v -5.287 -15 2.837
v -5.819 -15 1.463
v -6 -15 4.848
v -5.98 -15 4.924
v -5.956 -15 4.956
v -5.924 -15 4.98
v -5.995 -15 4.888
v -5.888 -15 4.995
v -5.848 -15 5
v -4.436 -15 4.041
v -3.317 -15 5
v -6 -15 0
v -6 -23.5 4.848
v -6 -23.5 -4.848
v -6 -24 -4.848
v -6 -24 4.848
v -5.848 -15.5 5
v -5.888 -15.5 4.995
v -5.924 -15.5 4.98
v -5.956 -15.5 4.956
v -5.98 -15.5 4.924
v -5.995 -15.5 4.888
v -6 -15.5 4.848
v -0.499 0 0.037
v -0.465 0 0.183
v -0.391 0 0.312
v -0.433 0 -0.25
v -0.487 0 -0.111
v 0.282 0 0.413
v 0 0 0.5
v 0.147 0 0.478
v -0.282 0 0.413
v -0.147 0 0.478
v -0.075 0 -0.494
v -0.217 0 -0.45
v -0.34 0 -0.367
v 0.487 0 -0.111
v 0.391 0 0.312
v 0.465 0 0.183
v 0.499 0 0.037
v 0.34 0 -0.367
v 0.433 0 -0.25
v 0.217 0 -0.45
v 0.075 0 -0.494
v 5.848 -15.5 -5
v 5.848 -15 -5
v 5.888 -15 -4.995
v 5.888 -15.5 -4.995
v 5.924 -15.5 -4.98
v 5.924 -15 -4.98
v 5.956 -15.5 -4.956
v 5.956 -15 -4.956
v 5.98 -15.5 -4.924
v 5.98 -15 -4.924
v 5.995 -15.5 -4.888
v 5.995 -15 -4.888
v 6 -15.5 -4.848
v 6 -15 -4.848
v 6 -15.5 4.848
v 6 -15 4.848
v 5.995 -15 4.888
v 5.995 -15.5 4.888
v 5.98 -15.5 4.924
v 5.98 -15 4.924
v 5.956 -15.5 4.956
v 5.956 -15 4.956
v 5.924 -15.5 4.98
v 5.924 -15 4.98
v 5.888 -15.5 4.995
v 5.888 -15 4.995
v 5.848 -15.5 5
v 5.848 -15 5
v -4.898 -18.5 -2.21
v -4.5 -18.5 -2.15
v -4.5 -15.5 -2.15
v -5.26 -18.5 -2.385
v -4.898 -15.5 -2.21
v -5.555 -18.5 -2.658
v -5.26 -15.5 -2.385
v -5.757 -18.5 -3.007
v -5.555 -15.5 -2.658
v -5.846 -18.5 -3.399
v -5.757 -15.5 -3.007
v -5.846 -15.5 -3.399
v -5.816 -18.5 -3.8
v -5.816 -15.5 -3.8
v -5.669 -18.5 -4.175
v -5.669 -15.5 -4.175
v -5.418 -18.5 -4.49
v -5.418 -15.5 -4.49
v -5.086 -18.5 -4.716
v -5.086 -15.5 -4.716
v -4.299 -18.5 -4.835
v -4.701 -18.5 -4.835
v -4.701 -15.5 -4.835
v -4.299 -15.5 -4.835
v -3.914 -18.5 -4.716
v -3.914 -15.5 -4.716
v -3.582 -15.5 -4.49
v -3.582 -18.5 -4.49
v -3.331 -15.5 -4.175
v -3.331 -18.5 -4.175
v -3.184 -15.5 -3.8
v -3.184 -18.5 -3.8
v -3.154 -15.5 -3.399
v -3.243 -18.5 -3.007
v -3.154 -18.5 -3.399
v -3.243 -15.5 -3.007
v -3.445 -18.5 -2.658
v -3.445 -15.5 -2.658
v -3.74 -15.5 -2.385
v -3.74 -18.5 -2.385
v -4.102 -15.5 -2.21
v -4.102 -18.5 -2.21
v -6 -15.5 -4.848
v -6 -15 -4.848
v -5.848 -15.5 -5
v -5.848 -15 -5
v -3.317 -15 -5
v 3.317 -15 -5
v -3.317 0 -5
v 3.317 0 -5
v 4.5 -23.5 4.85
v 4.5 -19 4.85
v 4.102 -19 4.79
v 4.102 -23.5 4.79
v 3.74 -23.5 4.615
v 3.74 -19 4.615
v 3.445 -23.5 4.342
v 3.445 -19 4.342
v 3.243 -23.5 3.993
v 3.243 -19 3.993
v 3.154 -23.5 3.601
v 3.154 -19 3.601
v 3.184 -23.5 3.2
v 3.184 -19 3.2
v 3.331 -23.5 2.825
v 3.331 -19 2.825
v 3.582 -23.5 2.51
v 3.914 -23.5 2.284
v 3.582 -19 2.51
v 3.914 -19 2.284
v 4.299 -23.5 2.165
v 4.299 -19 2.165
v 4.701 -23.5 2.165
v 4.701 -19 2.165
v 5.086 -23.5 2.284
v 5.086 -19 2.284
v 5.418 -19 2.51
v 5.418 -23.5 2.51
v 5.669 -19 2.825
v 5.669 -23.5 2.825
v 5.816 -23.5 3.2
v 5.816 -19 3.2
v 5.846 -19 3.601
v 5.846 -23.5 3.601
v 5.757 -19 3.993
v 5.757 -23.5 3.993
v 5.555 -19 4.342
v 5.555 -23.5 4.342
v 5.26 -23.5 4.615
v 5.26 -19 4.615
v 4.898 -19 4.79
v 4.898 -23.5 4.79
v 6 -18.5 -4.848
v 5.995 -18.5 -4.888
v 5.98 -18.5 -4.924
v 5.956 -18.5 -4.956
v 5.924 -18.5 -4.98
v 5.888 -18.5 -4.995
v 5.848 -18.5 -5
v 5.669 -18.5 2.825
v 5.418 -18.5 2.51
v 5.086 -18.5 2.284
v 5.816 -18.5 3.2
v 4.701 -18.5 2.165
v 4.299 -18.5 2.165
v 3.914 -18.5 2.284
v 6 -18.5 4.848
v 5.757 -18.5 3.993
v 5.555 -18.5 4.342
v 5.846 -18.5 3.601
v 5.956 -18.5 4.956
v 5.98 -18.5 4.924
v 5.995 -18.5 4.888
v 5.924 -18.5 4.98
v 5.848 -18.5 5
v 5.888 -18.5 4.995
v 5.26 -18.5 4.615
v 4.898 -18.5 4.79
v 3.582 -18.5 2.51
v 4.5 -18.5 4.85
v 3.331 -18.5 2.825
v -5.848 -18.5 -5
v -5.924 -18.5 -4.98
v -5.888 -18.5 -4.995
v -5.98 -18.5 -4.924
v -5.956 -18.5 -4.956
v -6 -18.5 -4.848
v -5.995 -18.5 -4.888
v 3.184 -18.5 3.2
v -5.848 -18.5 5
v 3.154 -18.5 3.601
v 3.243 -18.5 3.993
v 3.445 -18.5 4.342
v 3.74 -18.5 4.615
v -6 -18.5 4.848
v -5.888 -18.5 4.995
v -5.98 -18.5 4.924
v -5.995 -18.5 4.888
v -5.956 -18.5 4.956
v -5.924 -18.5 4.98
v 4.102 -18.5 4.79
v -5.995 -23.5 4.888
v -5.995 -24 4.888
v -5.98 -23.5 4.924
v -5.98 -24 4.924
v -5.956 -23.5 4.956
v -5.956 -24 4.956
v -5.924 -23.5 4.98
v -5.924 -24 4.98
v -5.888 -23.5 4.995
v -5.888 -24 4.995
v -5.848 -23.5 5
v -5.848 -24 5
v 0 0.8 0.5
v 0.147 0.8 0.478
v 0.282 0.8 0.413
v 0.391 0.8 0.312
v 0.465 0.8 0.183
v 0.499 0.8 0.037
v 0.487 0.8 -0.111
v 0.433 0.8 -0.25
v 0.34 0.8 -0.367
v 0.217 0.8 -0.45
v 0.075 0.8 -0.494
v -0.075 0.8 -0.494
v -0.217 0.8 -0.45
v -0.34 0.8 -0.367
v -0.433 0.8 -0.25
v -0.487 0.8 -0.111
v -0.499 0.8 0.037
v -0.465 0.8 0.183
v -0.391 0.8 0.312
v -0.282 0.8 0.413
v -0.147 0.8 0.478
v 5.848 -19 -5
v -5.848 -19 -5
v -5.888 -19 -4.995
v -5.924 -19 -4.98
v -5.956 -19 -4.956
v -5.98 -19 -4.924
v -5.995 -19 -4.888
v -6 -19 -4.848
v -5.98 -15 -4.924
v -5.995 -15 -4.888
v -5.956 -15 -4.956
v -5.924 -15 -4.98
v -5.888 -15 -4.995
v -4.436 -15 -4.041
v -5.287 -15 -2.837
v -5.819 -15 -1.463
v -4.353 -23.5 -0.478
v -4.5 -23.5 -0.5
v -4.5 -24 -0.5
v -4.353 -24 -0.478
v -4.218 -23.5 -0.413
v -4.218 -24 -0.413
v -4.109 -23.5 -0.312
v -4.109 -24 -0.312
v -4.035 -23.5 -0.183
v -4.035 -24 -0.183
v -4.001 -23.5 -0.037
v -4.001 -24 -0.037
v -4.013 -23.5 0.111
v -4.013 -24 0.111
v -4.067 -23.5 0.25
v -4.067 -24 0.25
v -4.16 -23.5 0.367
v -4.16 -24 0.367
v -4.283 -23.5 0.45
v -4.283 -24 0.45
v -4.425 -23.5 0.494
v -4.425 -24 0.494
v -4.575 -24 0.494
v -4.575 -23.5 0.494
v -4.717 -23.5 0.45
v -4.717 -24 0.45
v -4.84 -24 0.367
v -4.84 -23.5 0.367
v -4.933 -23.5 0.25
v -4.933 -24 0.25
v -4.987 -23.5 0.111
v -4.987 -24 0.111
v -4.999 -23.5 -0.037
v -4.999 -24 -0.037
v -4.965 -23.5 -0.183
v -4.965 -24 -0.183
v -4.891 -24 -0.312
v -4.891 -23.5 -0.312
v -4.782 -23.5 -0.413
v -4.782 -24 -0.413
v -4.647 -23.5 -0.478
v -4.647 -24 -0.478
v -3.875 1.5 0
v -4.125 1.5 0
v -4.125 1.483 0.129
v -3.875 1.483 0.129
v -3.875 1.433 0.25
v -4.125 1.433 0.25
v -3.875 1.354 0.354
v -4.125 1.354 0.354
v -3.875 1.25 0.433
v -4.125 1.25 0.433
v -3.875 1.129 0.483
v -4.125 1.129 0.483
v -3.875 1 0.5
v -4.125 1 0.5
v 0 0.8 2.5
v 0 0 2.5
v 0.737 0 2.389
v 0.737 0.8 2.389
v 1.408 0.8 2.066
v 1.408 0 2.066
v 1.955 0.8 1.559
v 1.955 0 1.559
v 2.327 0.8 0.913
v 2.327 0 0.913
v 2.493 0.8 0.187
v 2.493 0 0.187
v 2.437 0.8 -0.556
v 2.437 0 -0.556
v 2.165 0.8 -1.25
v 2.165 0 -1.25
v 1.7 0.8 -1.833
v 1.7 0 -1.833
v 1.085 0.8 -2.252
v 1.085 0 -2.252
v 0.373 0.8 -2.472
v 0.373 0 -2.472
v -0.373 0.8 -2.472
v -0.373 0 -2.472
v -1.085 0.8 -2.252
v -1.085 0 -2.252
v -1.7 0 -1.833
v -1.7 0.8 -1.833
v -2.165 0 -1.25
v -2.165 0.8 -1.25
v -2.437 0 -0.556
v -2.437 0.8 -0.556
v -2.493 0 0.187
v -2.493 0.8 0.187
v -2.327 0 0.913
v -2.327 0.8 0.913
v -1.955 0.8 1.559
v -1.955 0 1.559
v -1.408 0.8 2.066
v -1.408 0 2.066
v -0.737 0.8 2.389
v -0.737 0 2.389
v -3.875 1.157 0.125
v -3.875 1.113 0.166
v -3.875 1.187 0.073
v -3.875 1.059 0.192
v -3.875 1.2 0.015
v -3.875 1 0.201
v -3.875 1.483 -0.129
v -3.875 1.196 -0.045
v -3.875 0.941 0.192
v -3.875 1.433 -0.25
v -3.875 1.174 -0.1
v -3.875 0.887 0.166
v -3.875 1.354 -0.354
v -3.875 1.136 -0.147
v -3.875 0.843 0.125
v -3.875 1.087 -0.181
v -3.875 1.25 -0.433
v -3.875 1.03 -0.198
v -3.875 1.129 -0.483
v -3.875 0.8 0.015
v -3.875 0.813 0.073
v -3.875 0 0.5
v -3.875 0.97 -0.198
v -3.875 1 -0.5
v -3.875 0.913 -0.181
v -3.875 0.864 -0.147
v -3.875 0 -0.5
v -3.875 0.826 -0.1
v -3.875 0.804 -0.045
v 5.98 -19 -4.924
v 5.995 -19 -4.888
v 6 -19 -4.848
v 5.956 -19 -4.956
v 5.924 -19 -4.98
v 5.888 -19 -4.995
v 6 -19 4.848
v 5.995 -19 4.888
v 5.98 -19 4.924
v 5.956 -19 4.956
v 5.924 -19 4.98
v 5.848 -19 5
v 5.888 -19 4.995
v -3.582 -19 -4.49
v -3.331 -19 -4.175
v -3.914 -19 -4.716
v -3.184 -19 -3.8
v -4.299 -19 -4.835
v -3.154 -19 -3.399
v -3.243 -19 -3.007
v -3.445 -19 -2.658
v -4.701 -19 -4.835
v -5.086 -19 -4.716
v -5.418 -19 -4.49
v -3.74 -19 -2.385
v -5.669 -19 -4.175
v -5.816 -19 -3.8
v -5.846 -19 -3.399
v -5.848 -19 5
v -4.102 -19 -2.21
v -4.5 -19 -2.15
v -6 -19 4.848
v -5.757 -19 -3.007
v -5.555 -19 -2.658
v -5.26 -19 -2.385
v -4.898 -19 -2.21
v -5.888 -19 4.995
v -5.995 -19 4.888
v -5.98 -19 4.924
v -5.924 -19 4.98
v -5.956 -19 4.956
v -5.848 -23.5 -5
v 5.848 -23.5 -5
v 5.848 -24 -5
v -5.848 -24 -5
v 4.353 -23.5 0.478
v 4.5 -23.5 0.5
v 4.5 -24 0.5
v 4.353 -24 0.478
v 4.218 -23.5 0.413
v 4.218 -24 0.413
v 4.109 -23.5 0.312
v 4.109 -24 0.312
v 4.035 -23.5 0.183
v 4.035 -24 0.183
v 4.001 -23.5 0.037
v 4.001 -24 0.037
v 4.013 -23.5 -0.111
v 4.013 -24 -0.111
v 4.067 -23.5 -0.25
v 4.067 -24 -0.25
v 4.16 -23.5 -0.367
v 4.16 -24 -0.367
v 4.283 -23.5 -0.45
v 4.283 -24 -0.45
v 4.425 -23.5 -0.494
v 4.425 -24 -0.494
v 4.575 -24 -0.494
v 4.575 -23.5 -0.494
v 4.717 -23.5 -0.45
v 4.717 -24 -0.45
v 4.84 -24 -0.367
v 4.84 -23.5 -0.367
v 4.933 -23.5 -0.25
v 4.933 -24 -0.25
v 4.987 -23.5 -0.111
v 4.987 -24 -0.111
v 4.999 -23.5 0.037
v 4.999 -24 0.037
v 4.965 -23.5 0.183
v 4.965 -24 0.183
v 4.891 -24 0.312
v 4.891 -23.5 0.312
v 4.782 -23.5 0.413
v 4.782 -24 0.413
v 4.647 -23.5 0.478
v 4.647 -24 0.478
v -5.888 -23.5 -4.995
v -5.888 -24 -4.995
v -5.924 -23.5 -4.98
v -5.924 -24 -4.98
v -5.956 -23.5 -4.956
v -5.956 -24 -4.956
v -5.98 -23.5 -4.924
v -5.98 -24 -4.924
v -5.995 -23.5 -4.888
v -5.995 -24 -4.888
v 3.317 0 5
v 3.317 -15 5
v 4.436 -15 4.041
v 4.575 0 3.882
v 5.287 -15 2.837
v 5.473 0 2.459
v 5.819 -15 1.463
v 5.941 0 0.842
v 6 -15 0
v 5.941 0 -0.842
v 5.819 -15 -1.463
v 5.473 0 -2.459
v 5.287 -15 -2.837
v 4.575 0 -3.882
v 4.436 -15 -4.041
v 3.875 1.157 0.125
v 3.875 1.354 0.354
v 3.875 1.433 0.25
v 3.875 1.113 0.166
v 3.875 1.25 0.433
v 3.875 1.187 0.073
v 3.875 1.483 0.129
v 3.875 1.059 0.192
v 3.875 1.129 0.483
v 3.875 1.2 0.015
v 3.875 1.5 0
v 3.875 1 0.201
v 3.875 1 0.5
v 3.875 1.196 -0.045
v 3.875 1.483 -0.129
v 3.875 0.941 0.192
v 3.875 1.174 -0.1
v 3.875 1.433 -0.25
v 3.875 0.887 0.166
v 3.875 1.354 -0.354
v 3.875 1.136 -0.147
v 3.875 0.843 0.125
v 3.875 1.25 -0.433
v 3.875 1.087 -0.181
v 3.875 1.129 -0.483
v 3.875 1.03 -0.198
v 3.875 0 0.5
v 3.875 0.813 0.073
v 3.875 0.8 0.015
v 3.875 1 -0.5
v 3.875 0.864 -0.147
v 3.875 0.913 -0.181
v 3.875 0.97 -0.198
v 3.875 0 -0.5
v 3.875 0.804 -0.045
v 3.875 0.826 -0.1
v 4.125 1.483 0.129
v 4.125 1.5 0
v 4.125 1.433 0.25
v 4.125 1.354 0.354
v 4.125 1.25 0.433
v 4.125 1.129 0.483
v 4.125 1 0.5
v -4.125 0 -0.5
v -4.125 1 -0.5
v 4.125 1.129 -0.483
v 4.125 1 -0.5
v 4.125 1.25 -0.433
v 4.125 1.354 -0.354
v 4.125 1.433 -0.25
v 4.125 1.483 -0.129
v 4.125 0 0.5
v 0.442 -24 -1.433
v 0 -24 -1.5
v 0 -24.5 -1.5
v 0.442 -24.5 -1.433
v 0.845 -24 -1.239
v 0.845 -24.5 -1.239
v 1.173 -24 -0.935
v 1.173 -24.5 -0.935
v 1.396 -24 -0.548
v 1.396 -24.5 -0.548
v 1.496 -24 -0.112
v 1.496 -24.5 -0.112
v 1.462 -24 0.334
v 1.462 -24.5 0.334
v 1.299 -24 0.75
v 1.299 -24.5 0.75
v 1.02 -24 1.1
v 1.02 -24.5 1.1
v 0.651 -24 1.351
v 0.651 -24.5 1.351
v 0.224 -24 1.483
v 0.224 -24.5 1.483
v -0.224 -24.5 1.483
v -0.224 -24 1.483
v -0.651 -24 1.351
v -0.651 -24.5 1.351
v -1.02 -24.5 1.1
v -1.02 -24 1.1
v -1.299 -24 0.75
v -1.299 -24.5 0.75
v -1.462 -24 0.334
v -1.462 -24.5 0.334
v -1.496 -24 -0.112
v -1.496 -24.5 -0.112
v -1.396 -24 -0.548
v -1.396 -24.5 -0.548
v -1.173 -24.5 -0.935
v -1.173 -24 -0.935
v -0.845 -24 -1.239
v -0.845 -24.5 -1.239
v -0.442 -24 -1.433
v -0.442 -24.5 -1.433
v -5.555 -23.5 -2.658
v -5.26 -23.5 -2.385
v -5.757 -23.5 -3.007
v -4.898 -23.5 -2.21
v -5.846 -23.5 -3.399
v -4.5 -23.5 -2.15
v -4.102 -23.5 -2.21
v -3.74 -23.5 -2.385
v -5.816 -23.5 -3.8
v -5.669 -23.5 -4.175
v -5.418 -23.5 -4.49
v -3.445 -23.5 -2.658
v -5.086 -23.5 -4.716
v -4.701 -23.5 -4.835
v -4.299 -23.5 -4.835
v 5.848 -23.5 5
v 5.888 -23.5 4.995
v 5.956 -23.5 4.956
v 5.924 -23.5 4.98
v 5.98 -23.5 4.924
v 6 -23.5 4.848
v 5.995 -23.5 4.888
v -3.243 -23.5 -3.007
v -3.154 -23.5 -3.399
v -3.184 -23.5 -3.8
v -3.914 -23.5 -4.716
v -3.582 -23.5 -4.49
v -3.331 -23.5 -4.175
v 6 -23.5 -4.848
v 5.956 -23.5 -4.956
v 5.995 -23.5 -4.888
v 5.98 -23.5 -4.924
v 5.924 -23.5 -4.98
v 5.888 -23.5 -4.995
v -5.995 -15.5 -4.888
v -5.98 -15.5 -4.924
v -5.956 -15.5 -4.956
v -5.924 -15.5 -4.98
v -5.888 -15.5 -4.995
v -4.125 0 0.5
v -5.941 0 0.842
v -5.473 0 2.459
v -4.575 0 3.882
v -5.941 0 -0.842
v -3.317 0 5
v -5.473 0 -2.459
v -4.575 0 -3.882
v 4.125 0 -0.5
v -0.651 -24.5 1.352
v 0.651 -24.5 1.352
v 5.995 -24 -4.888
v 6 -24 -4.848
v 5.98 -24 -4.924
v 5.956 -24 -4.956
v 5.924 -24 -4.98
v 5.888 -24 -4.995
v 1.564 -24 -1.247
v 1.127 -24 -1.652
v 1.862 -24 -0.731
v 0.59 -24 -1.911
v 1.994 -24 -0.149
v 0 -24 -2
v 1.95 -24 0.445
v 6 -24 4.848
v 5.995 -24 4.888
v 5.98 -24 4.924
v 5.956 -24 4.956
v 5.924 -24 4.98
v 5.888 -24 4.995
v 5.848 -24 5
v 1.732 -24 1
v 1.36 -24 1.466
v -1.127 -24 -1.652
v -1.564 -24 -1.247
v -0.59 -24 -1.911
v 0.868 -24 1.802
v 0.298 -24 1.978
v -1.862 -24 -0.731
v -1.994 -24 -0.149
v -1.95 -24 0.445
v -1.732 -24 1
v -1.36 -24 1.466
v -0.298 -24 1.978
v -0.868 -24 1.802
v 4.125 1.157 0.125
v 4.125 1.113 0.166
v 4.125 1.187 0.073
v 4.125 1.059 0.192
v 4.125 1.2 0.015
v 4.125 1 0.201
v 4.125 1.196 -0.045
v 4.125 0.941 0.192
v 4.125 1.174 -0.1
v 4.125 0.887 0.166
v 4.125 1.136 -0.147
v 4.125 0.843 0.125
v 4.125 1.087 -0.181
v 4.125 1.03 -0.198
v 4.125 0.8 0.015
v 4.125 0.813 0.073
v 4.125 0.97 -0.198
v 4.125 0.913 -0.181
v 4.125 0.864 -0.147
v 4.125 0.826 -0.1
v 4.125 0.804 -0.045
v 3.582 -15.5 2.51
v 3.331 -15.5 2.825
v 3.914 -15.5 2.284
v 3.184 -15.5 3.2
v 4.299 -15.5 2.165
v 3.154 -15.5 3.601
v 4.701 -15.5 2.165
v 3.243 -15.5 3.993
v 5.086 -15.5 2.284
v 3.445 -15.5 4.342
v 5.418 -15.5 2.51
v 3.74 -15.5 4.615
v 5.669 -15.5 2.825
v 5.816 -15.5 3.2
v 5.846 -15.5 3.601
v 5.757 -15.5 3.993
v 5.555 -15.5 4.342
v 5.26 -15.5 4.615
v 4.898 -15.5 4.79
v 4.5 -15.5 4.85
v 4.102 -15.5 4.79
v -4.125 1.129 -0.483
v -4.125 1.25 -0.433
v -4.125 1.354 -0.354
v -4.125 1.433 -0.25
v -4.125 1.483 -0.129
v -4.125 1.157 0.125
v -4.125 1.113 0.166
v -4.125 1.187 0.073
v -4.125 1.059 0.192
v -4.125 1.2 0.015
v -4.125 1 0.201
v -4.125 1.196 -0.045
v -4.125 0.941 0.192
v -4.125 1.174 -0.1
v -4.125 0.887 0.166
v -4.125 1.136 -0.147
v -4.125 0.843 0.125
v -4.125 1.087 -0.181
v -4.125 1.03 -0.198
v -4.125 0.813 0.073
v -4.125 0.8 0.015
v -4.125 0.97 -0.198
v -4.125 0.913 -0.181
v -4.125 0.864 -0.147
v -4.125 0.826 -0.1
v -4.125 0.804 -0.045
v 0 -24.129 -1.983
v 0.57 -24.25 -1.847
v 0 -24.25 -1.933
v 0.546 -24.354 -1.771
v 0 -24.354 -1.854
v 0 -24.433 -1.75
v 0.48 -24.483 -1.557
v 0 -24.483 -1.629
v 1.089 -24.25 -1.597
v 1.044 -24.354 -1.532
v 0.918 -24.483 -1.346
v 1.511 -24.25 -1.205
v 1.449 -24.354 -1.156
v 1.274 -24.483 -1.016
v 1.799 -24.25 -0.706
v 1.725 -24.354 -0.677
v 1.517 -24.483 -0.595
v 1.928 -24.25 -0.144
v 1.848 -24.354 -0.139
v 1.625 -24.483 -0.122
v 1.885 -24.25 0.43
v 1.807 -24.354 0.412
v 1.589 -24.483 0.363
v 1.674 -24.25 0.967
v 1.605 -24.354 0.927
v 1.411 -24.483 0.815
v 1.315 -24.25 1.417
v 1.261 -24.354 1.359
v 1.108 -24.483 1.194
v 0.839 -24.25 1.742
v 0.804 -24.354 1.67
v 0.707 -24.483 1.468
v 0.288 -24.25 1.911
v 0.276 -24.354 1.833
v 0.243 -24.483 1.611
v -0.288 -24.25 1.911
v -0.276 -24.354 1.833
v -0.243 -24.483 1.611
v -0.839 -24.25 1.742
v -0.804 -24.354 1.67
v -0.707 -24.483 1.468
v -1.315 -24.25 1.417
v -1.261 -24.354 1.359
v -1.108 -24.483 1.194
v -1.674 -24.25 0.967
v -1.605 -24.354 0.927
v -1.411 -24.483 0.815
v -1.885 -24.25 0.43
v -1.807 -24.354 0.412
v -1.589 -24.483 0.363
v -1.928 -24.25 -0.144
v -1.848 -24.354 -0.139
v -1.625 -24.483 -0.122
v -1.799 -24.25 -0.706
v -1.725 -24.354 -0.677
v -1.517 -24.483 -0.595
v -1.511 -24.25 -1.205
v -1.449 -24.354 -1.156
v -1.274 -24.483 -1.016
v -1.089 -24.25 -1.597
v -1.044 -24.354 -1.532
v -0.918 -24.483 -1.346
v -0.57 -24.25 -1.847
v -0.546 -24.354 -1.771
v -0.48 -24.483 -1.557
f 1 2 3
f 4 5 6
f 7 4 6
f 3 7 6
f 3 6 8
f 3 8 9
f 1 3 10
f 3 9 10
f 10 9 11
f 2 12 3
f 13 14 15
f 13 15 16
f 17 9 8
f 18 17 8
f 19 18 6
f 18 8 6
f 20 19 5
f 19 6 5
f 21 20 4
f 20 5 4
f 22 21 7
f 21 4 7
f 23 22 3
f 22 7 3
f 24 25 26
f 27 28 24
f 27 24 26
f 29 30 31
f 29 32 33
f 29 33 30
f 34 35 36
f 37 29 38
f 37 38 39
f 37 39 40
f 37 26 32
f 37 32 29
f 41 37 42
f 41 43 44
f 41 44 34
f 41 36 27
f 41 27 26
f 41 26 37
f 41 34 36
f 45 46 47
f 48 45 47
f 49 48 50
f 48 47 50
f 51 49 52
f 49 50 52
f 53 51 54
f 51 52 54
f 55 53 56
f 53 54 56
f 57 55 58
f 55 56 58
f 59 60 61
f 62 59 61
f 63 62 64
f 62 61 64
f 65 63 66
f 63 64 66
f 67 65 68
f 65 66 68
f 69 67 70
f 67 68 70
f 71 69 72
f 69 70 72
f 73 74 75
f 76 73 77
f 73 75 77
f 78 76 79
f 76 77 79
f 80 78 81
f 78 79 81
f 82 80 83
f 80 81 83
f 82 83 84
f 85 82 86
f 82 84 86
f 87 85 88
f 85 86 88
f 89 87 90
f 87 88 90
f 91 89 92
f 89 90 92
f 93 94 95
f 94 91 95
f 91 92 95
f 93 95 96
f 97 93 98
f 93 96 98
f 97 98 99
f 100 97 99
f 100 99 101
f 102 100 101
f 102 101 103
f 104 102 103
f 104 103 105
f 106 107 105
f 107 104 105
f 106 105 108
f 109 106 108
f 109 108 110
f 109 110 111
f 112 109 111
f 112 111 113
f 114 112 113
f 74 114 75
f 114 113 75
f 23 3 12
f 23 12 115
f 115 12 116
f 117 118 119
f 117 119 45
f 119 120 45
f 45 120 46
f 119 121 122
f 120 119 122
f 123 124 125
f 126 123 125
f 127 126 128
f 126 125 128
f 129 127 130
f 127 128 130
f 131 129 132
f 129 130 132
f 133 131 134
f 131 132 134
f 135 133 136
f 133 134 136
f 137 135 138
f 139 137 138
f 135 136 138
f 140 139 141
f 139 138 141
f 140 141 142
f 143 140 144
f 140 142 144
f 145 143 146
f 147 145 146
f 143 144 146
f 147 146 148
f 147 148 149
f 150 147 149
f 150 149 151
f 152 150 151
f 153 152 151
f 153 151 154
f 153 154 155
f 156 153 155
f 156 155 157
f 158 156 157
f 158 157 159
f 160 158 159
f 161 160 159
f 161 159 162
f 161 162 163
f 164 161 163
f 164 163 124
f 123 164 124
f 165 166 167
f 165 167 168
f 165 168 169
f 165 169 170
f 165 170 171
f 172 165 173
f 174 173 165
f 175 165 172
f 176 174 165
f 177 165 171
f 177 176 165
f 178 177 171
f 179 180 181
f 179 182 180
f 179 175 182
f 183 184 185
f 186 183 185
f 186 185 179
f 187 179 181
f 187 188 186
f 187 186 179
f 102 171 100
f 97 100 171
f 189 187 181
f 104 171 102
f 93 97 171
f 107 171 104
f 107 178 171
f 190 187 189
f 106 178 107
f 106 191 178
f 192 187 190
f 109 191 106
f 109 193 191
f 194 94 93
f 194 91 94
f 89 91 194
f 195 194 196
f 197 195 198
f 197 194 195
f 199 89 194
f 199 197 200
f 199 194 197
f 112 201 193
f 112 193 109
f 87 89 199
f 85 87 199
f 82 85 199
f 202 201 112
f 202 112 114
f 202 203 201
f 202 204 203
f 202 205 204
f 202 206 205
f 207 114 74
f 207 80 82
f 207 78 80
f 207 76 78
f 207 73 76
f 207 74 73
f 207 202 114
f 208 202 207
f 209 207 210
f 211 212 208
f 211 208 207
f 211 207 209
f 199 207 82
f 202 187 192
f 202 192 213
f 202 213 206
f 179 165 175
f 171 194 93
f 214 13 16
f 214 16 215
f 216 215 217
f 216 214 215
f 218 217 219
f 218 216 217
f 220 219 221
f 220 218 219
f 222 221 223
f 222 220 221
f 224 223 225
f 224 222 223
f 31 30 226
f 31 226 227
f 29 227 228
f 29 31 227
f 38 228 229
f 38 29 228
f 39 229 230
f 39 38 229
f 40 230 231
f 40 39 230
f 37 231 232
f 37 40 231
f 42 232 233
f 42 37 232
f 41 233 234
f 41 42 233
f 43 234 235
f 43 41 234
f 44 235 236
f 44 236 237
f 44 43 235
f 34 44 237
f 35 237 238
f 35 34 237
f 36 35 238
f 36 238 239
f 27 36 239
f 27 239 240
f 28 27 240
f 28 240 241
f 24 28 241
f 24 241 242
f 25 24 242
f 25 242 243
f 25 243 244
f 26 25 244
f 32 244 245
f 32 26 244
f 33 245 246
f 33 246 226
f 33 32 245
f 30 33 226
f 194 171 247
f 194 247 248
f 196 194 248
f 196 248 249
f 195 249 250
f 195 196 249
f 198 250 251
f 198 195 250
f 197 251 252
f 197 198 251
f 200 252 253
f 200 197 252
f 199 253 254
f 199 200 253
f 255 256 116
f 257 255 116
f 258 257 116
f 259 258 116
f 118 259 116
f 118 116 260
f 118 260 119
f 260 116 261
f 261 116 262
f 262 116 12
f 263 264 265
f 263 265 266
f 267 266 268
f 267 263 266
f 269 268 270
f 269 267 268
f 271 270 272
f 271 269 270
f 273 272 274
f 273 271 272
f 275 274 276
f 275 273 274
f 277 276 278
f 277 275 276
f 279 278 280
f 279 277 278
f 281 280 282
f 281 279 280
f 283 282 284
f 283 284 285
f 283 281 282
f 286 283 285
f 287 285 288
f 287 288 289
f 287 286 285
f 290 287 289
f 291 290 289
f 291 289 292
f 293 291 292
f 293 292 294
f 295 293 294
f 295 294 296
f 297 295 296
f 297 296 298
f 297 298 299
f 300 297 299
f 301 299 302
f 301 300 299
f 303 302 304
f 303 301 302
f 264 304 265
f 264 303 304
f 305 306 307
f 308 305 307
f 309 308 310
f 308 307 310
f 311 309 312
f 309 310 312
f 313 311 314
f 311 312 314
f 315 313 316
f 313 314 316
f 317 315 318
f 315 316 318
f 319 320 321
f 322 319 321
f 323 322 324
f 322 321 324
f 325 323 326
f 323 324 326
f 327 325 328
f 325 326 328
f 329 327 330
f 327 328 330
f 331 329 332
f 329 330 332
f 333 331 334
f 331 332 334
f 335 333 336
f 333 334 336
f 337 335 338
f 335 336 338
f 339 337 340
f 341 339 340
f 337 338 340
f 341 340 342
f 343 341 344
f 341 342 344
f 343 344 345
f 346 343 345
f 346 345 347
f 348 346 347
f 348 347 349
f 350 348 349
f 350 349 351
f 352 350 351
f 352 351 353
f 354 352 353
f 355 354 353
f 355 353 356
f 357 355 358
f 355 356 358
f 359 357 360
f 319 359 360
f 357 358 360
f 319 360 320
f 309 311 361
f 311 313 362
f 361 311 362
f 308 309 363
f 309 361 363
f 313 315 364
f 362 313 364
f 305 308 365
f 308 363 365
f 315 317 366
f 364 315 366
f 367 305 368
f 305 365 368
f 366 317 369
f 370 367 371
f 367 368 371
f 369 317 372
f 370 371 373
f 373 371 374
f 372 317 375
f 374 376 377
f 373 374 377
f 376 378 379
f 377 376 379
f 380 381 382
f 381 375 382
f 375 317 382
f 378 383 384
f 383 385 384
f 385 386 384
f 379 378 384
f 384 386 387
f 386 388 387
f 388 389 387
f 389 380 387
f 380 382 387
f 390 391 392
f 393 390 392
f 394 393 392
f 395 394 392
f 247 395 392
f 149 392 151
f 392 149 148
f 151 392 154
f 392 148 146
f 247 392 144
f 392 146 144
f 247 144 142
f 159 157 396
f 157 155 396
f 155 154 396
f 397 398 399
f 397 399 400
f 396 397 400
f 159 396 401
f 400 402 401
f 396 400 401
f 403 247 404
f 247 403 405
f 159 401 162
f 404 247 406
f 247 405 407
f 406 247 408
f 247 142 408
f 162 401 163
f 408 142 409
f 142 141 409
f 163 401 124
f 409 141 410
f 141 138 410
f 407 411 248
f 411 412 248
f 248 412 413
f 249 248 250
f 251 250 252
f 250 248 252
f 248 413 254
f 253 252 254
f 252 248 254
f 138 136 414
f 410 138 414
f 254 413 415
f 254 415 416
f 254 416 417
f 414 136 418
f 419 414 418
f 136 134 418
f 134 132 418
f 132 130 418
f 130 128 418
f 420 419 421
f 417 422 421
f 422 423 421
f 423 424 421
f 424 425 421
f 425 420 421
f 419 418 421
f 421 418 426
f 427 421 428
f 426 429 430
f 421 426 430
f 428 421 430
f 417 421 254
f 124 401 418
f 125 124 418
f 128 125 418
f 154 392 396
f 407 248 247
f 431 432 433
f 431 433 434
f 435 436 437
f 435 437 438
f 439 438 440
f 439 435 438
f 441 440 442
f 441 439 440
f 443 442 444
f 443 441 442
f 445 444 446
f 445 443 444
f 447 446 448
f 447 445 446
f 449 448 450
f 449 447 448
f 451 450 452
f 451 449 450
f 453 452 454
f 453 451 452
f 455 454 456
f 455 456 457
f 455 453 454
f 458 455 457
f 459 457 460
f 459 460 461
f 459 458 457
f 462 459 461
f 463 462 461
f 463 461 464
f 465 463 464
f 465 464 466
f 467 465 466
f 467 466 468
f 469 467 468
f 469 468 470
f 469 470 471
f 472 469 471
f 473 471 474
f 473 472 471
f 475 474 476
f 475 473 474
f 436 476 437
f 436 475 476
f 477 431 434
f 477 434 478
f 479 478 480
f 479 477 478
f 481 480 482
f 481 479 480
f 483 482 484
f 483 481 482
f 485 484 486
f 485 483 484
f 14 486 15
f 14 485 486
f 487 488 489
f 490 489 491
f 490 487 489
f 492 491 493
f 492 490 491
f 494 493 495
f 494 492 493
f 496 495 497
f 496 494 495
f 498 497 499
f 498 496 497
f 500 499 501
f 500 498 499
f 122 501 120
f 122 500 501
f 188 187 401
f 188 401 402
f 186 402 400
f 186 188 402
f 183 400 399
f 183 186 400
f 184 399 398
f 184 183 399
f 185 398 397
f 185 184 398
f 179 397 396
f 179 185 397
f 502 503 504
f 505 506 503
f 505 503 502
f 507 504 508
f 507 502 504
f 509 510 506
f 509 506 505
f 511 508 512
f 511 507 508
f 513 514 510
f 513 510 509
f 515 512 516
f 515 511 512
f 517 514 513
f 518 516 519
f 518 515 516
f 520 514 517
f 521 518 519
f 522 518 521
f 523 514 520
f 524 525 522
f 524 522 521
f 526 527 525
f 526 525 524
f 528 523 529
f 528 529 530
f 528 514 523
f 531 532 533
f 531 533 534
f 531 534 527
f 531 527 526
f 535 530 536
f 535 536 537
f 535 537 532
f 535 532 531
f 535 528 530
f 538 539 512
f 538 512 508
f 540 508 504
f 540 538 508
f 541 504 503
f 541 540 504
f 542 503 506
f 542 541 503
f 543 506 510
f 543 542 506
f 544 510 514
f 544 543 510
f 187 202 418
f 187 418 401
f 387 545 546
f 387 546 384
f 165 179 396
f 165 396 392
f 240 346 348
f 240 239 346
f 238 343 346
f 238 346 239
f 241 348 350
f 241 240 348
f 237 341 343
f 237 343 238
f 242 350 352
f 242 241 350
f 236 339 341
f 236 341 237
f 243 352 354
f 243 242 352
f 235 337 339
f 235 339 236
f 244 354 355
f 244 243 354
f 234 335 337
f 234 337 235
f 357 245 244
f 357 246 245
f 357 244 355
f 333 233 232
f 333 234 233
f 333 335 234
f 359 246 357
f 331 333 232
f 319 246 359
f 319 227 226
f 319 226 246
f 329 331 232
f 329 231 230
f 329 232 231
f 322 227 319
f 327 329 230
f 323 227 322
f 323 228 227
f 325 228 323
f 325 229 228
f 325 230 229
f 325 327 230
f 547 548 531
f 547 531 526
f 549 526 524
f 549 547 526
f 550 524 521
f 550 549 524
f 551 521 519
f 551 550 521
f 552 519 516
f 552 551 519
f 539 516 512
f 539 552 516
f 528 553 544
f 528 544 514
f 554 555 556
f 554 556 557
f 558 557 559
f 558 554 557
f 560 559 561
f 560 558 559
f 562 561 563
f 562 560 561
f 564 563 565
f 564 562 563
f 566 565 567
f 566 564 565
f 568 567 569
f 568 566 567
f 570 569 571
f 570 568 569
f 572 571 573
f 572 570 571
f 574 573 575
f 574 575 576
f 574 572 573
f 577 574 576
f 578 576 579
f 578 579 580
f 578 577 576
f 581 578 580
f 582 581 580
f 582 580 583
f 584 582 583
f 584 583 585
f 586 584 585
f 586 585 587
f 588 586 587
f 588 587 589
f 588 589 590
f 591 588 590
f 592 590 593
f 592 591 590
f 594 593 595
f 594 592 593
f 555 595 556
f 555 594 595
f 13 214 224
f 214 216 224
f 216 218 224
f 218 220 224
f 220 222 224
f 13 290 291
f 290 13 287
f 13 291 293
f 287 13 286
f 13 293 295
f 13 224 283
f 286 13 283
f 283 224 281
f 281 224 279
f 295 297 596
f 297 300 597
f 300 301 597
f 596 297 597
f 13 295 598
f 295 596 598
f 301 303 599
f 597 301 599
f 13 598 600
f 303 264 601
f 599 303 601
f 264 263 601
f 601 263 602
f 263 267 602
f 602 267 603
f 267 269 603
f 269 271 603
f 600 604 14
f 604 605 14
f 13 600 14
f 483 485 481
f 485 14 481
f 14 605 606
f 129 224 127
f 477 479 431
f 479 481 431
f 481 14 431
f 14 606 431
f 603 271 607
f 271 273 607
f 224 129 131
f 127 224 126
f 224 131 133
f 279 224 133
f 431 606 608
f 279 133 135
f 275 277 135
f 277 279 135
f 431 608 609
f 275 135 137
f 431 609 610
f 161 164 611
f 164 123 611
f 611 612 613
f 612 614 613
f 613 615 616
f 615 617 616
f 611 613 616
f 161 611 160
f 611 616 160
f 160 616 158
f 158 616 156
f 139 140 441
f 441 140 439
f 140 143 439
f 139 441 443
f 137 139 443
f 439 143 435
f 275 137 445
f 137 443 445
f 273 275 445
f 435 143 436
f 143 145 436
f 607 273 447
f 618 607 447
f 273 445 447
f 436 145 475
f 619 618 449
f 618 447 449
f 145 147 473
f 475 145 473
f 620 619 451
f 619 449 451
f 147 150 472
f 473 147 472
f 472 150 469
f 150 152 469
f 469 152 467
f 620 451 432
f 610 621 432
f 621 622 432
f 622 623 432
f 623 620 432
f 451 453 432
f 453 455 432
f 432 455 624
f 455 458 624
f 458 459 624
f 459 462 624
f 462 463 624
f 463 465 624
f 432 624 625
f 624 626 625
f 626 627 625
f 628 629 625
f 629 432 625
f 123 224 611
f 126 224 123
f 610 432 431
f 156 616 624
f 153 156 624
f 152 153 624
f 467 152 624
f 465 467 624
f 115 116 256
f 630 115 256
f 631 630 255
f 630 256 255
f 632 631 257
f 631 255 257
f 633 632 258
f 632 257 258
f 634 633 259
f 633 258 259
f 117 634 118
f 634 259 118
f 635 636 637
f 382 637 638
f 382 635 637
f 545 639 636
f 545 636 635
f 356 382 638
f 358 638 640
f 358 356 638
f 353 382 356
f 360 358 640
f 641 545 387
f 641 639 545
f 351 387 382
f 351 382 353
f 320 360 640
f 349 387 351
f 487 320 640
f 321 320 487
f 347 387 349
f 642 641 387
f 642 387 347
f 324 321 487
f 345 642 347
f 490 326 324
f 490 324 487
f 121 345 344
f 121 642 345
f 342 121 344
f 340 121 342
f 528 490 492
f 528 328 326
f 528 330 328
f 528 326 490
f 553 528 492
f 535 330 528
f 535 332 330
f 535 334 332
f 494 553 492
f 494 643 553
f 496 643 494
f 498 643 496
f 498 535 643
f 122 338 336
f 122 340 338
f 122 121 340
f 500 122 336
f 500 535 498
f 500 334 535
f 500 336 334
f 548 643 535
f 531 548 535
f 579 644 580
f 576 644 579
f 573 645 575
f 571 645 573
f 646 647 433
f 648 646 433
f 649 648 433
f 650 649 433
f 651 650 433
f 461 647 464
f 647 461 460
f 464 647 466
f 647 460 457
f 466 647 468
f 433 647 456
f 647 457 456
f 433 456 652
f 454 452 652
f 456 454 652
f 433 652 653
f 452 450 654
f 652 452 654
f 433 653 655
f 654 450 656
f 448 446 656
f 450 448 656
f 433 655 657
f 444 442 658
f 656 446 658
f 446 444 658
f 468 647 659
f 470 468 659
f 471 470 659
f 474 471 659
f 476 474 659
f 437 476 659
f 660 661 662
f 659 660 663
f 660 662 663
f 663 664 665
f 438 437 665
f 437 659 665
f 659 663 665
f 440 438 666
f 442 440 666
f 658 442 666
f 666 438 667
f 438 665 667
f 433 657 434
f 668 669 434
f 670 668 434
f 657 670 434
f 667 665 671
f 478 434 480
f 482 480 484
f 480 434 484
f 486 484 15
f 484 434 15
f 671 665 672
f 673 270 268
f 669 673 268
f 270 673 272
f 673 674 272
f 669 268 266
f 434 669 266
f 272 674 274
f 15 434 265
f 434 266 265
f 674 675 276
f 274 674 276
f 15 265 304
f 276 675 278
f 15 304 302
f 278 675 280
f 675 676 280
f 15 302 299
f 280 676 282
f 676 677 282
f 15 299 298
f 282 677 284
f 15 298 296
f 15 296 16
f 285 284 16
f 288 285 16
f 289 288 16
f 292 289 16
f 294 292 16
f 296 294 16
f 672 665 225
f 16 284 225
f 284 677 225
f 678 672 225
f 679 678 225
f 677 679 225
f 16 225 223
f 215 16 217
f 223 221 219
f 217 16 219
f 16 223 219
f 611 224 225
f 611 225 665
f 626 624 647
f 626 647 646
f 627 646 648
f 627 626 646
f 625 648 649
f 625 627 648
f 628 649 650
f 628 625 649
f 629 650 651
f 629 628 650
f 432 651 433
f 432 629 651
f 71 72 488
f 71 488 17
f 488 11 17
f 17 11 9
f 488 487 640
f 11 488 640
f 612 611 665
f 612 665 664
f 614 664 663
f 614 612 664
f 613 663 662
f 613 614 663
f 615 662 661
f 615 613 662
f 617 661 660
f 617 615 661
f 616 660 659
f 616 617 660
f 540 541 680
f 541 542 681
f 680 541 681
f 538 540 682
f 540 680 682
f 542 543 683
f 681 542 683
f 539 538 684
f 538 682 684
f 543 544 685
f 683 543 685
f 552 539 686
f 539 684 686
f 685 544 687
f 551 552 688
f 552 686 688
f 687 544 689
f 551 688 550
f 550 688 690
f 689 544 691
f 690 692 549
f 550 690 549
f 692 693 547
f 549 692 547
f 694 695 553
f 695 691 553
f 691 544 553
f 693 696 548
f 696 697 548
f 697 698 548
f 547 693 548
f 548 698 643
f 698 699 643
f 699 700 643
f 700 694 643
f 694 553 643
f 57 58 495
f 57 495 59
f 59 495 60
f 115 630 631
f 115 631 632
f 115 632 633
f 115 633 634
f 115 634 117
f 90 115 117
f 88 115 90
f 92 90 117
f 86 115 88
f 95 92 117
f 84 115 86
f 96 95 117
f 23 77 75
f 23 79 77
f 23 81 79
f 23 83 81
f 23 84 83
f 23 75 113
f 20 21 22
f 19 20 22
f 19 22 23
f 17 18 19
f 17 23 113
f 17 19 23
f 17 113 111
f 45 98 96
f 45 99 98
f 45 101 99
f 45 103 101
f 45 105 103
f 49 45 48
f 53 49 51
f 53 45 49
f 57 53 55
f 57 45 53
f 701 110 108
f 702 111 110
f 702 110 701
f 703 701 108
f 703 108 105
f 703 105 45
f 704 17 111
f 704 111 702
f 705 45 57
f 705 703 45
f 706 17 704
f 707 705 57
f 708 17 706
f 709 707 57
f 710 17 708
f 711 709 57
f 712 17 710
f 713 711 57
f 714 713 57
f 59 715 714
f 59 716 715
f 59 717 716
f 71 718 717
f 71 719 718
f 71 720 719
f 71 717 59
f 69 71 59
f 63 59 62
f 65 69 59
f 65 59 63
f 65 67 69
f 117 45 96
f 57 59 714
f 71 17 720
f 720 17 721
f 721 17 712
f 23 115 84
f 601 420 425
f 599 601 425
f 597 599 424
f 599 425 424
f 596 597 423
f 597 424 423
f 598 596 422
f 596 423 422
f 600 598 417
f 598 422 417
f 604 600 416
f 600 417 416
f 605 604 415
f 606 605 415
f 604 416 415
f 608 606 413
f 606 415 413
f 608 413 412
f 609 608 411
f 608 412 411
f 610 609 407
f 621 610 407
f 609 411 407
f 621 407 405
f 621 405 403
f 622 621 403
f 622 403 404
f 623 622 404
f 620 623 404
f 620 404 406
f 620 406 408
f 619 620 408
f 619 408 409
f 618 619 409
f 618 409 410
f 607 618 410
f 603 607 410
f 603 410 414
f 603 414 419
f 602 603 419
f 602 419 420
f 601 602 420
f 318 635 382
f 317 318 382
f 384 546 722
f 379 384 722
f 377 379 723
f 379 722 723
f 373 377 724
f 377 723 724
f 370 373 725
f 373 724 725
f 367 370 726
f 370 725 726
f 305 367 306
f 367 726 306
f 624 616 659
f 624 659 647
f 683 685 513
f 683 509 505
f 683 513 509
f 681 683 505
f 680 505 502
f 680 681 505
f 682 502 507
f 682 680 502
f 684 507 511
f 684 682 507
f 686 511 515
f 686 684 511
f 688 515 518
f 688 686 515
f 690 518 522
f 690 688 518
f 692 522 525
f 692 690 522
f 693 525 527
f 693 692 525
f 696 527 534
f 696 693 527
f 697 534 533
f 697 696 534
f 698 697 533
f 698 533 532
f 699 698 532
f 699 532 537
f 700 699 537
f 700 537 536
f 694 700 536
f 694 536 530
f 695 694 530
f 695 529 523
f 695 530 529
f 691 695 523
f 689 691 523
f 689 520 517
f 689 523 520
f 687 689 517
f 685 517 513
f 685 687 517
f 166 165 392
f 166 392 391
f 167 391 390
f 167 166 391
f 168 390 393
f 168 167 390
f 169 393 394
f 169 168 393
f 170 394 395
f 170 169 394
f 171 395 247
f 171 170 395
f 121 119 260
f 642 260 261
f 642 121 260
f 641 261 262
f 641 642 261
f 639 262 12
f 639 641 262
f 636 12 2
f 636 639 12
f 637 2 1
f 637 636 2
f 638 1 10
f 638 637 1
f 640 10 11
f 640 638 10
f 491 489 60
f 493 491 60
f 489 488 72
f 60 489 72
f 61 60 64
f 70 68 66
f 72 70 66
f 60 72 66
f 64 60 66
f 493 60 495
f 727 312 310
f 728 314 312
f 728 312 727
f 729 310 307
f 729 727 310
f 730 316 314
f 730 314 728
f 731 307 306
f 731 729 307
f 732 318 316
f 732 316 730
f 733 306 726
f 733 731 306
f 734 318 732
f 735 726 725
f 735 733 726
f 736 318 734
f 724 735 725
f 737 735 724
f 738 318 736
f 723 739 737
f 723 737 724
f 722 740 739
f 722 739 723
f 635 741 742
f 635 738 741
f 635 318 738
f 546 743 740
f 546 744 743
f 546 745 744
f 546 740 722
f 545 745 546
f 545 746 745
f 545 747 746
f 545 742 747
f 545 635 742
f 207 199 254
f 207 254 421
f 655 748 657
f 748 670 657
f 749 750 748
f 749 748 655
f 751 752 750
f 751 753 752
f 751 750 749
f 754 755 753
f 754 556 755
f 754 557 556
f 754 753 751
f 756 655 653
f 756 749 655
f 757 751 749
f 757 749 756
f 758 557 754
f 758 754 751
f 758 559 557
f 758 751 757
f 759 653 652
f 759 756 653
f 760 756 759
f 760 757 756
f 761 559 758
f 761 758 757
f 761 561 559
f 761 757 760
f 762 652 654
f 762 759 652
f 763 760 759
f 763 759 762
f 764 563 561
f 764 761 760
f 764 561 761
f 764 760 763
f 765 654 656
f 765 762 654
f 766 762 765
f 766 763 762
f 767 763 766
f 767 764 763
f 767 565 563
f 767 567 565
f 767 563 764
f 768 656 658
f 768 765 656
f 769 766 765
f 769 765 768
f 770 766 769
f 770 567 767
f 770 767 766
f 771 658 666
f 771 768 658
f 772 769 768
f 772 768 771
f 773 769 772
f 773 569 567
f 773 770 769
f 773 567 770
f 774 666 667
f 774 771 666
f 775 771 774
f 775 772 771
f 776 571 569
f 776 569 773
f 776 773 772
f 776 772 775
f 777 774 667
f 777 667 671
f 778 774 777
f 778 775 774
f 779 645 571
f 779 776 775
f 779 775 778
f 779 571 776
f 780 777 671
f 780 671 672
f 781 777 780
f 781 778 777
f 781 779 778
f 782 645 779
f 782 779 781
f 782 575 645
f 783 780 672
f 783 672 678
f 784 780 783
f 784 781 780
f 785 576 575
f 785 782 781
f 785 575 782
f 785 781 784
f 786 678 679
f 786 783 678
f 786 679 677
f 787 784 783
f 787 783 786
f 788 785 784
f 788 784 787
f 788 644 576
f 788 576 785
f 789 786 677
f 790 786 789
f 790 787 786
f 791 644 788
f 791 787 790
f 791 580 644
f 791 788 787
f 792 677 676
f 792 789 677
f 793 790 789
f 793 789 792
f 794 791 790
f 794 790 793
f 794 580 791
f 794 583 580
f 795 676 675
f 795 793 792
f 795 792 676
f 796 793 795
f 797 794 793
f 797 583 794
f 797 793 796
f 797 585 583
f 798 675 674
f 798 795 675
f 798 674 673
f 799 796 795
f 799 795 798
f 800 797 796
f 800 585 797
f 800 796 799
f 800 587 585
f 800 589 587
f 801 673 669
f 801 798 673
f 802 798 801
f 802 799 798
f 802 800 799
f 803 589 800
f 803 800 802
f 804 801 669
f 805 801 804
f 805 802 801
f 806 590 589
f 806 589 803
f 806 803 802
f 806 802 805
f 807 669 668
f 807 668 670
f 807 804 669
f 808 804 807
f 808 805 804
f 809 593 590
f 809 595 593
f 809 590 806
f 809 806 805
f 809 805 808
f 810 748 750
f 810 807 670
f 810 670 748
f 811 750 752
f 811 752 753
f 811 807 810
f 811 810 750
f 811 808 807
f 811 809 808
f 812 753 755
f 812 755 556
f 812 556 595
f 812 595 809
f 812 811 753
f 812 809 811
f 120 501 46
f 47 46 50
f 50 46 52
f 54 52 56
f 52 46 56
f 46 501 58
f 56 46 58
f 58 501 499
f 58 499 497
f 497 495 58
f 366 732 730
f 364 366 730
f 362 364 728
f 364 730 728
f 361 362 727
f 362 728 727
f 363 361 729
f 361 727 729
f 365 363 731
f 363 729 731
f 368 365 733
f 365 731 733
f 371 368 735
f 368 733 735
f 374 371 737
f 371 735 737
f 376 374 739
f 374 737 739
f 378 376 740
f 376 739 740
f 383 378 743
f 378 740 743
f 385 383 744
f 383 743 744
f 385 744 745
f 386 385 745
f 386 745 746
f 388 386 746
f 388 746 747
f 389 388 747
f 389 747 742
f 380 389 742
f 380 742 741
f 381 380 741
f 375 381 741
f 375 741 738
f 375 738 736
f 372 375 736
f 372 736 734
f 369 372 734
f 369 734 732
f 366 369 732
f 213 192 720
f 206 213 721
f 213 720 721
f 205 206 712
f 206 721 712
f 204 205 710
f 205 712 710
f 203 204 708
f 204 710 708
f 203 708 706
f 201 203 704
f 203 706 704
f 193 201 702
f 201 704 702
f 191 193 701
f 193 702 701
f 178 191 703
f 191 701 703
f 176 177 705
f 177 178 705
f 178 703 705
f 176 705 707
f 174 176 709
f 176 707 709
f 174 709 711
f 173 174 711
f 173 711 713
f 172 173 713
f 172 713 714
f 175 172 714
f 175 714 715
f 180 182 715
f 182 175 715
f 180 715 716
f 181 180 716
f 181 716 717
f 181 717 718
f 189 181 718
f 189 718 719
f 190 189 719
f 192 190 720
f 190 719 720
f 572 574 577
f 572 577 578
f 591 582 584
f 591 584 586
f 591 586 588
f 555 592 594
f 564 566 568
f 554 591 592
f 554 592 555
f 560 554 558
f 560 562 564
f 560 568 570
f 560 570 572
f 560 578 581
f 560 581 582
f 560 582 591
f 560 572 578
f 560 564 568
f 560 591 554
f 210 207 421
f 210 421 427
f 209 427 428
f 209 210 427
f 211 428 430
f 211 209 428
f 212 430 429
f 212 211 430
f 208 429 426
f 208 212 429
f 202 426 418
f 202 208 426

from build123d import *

# Parameters (mm, degrees)
SKETCH1_R            = 2.5
SKETCH1_W            = 0.25
SKETCH1_H            = 1
SKETCH1_R_2          = 0.5
BOSS_EXTRUDE1_DEPTH  = 15
SKETCH1_3_R          = 2.5
SKETCH1_3_R_2        = 0.5
BOSS_EXTRUDE2_DEPTH  = 0.8
SKETCH1_5_W          = 0.25
SKETCH1_5_H          = 1
BOSS_EXTRUDE3_DEPTH  = 1.5
SKETCH2_R            = 0.200548898
CUT_EXTRUDE3_DEPTH   = 1.5
BOSS_EXTRUDE4_DEPTH  = 0.5
BOSS_EXTRUDE6_START  = 3
BOSS_EXTRUDE6_DEPTH  = 0.5
SKETCH6_R            = 1.35
BOSS_EXTRUDE7_DEPTH  = 8
BOSS_EXTRUDE9_START  = 4.5
SKETCH9_R            = 0.5
SKETCH9_R_2          = 1.5
BOSS_EXTRUDE9_DEPTH  = 0.5
SKETCH10_R           = 2
SKETCH10_R_2         = 1.5
BOSS_EXTRUDE10_DEPTH = 0.5
FILLET1_R            = 0.5
BOSS_EXTRUDE11_START = -0.5
SKETCH11_R           = 1.5
BOSS_EXTRUDE11_DEPTH = 0.5


with BuildPart() as part:
    # Sketch1 → Boss-Extrude1 (new body)
    # profile 1 of 5: a face of its own
    with BuildSketch(Plane(origin=(0, 0, 0), x_dir=(1, 0, 0), z_dir=(0, 1, 0))):
        with BuildLine():
            Line((-3.31662479, -5), (3.31662479, -5))
            ThreePointArc((3.31662479, -5), (6, 0), (3.31662479, 5))
            Line((3.31662479, 5), (-3.31662479, 5))
            ThreePointArc((-3.31662479, 5), (-6, 0), (-3.31662479, -5))
        make_face()
        Circle(SKETCH1_R, mode=Mode.SUBTRACT)
        with Locations((4, 0)):
            Rectangle(SKETCH1_W, SKETCH1_H, mode=Mode.SUBTRACT)
        with Locations((-4, 0)):
            Rectangle(SKETCH1_W, SKETCH1_H, mode=Mode.SUBTRACT)
    # profile 2 of 5: a face of its own
    with BuildSketch(Plane(origin=(0, 0, 0), x_dir=(1, 0, 0), z_dir=(0, 1, 0))):
        Circle(SKETCH1_R)
        Circle(SKETCH1_R_2, mode=Mode.SUBTRACT)
    # profile 3 of 5: a face of its own
    with BuildSketch(Plane(origin=(0, 0, 0), x_dir=(1, 0, 0), z_dir=(0, 1, 0))):
        with Locations((-4, 0)):
            Rectangle(SKETCH1_W, SKETCH1_H)
    # profile 4 of 5: a face of its own
    with BuildSketch(Plane(origin=(0, 0, 0), x_dir=(1, 0, 0), z_dir=(0, 1, 0))):
        Circle(SKETCH1_R_2)
    # profile 5 of 5: a face of its own
    with BuildSketch(Plane(origin=(0, 0, 0), x_dir=(1, 0, 0), z_dir=(0, 1, 0))):
        with Locations((4, 0)):
            Rectangle(SKETCH1_W, SKETCH1_H)
    extrude(amount=-BOSS_EXTRUDE1_DEPTH)

    # Sketch1<3> → Boss-Extrude2 (add)
    with BuildSketch(Plane(origin=(0, 0, 0), x_dir=(1, 0, 0), z_dir=(0, 1, 0))):
        with Locations(Location((0, 0, 0), (0, 0, 270))):
            Circle(SKETCH1_3_R)
        with Locations(Location((0, 0, 0), (0, 0, 270))):
            Circle(SKETCH1_3_R_2, mode=Mode.SUBTRACT)
    extrude(amount=BOSS_EXTRUDE2_DEPTH)

    # Sketch1<5> → Boss-Extrude3 (add)
    with BuildSketch(Plane(origin=(0, 0, 0), x_dir=(1, 0, 0), z_dir=(0, 1, 0))):
        with Locations((-4, 0)):
            Rectangle(SKETCH1_5_W, SKETCH1_5_H)
    boss_extrude3 = extrude(amount=BOSS_EXTRUDE3_DEPTH)

    # Sketch2 → Cut-Extrude3 (cut)
    with BuildSketch(Plane.ZY.offset(4.125)):
        with Locations((0, 1)):
            Circle(SKETCH2_R)
        with BuildLine():
            Line((-0.5, 1.5), (-0.5, 1))
            ThreePointArc((-0.5, 1), (-0.353553391, 1.353553391), (0, 1.5))
            Line((0, 1.5), (-0.5, 1.5))
        make_face()
        with BuildLine():
            Line((0.5, 1.5), (0, 1.5))
            ThreePointArc((0, 1.5), (0.353553391, 1.353553391), (0.5, 1))
            Line((0.5, 1), (0.5, 1.5))
        make_face()
    cut_extrude3 = extrude(amount=-CUT_EXTRUDE3_DEPTH, mode=Mode.SUBTRACT)

    # Mirror1: Boss-Extrude3, Cut-Extrude3 across plane
    add(boss_extrude3.mirror(Plane(origin=(0, 0, 0), x_dir=(0, 0, 1), z_dir=(1, 0, 0))))
    add(cut_extrude3.mirror(Plane(origin=(0, 0, 0), x_dir=(0, 0, 1), z_dir=(1, 0, 0))), mode=Mode.SUBTRACT)

    # Sketch3 → Boss-Extrude4 (add)
    with BuildSketch(Plane.XZ.offset(15)):
        with BuildLine():
            Line((-5.84848114, -5), (5.84848114, -5))
            ThreePointArc((5.84848114, -5), (5.955621153, -4.955621153), (6, -4.84848114))
            Line((6, -4.84848114), (6, 4.84848114))
            ThreePointArc((6, 4.84848114), (5.955621153, 4.955621153), (5.84848114, 5))
            Line((5.84848114, 5), (-5.84848114, 5))
            ThreePointArc((-5.84848114, 5), (-5.955621153, 4.955621153), (-6, 4.84848114))
            Line((-6, 4.84848114), (-6, -4.84848114))
            ThreePointArc((-6, -4.84848114), (-5.955621153, -4.955621153), (-5.84848114, -5))
        make_face()
    extrude(amount=BOSS_EXTRUDE4_DEPTH)



with BuildPart() as body_2:
    # Sketch7 → Boss-Extrude6 (new body)
    with BuildSketch(Plane.XZ.offset(15.5).offset(BOSS_EXTRUDE6_START)):
        with BuildLine():
            Line((-6, -4.84848114), (-6, 4.84848114))
            ThreePointArc((-6, 4.84848114), (-5.955621153, 4.955621153), (-5.84848114, 5))
            Line((-5.84848114, 5), (5.84848114, 5))
            ThreePointArc((5.84848114, 5), (5.955621153, 4.955621153), (6, 4.84848114))
            Line((6, 4.84848114), (6, -4.84848114))
            ThreePointArc((6, -4.84848114), (5.955621153, -4.955621153), (5.84848114, -5))
            Line((5.84848114, -5), (-5.84848114, -5))
            ThreePointArc((-5.84848114, -5), (-5.955621153, -4.955621153), (-6, -4.84848114))
        make_face()
    extrude(amount=BOSS_EXTRUDE6_DEPTH)


with BuildPart() as part_1:
    add(part.part)

    add(body_2.part)  # Boss-Extrude7 merges body 2
    # Sketch6 → Boss-Extrude7 (add)
    with BuildSketch(Plane.XZ.offset(15.5)):
        with Locations(Location((-4.5, -3.5, 0), (0, 0, 90))):
            Circle(SKETCH6_R)
        with Locations(Location((4.5, 3.5, 0), (0, 0, 90))):
            Circle(SKETCH6_R)
    extrude(amount=BOSS_EXTRUDE7_DEPTH)

    # Sketch9 → Boss-Extrude9 (add)
    with BuildSketch(Plane.XZ.offset(19).offset(BOSS_EXTRUDE9_START)):
        with BuildLine():
            Line((-5.84848114, 5), (5.84848114, 5))
            ThreePointArc((5.84848114, 5), (5.955621153, 4.955621153), (6, 4.84848114))
            Line((6, 4.84848114), (6, -4.84848114))
            ThreePointArc((6, -4.84848114), (5.955621153, -4.955621153), (5.84848114, -5))
            Line((5.84848114, -5), (-5.84848114, -5))
            ThreePointArc((-5.84848114, -5), (-5.955621153, -4.955621153), (-6, -4.84848114))
            Line((-6, -4.84848114), (-6, 4.84848114))
            ThreePointArc((-6, 4.84848114), (-5.955621153, 4.955621153), (-5.84848114, 5))
        make_face()
        with Locations(Location((-4.5, 0, 0), (0, 0, 270))):
            Circle(SKETCH9_R, mode=Mode.SUBTRACT)
        with Locations(Location((4.5, 0, 0), (0, 0, 90))):
            Circle(SKETCH9_R, mode=Mode.SUBTRACT)
        with Locations(Location((0, 0, 0), (0, 0, 270))):
            Circle(SKETCH9_R_2, mode=Mode.SUBTRACT)
    extrude(amount=BOSS_EXTRUDE9_DEPTH)

    # Sketch10 → Boss-Extrude10 (add)
    with BuildSketch(Plane.XZ.offset(24)):
        with Locations(Location((0, 0, 0), (0, 0, 270))):
            Circle(SKETCH10_R)
        with Locations(Location((0, 0, 0), (0, 0, 270))):
            Circle(SKETCH10_R_2, mode=Mode.SUBTRACT)
    extrude(amount=BOSS_EXTRUDE10_DEPTH)

    # Fillet1
    fillet1_edges = [part_1.edges().sort_by_distance(p)[0] for p in [
        (0, -24.5, 2),
    ]]
    fillet(fillet1_edges, radius=FILLET1_R - 0.0001)  # a hair under: the kernel refuses the full size

    # Sketch11 → Boss-Extrude11 (add)
    with BuildSketch(Plane.XZ.offset(24).offset(BOSS_EXTRUDE11_START)):
        with Locations(Location((0, 0, 0), (0, 0, 270))):
            Circle(SKETCH11_R)
    extrude(amount=BOSS_EXTRUDE11_DEPTH)


solid = part_1.part
